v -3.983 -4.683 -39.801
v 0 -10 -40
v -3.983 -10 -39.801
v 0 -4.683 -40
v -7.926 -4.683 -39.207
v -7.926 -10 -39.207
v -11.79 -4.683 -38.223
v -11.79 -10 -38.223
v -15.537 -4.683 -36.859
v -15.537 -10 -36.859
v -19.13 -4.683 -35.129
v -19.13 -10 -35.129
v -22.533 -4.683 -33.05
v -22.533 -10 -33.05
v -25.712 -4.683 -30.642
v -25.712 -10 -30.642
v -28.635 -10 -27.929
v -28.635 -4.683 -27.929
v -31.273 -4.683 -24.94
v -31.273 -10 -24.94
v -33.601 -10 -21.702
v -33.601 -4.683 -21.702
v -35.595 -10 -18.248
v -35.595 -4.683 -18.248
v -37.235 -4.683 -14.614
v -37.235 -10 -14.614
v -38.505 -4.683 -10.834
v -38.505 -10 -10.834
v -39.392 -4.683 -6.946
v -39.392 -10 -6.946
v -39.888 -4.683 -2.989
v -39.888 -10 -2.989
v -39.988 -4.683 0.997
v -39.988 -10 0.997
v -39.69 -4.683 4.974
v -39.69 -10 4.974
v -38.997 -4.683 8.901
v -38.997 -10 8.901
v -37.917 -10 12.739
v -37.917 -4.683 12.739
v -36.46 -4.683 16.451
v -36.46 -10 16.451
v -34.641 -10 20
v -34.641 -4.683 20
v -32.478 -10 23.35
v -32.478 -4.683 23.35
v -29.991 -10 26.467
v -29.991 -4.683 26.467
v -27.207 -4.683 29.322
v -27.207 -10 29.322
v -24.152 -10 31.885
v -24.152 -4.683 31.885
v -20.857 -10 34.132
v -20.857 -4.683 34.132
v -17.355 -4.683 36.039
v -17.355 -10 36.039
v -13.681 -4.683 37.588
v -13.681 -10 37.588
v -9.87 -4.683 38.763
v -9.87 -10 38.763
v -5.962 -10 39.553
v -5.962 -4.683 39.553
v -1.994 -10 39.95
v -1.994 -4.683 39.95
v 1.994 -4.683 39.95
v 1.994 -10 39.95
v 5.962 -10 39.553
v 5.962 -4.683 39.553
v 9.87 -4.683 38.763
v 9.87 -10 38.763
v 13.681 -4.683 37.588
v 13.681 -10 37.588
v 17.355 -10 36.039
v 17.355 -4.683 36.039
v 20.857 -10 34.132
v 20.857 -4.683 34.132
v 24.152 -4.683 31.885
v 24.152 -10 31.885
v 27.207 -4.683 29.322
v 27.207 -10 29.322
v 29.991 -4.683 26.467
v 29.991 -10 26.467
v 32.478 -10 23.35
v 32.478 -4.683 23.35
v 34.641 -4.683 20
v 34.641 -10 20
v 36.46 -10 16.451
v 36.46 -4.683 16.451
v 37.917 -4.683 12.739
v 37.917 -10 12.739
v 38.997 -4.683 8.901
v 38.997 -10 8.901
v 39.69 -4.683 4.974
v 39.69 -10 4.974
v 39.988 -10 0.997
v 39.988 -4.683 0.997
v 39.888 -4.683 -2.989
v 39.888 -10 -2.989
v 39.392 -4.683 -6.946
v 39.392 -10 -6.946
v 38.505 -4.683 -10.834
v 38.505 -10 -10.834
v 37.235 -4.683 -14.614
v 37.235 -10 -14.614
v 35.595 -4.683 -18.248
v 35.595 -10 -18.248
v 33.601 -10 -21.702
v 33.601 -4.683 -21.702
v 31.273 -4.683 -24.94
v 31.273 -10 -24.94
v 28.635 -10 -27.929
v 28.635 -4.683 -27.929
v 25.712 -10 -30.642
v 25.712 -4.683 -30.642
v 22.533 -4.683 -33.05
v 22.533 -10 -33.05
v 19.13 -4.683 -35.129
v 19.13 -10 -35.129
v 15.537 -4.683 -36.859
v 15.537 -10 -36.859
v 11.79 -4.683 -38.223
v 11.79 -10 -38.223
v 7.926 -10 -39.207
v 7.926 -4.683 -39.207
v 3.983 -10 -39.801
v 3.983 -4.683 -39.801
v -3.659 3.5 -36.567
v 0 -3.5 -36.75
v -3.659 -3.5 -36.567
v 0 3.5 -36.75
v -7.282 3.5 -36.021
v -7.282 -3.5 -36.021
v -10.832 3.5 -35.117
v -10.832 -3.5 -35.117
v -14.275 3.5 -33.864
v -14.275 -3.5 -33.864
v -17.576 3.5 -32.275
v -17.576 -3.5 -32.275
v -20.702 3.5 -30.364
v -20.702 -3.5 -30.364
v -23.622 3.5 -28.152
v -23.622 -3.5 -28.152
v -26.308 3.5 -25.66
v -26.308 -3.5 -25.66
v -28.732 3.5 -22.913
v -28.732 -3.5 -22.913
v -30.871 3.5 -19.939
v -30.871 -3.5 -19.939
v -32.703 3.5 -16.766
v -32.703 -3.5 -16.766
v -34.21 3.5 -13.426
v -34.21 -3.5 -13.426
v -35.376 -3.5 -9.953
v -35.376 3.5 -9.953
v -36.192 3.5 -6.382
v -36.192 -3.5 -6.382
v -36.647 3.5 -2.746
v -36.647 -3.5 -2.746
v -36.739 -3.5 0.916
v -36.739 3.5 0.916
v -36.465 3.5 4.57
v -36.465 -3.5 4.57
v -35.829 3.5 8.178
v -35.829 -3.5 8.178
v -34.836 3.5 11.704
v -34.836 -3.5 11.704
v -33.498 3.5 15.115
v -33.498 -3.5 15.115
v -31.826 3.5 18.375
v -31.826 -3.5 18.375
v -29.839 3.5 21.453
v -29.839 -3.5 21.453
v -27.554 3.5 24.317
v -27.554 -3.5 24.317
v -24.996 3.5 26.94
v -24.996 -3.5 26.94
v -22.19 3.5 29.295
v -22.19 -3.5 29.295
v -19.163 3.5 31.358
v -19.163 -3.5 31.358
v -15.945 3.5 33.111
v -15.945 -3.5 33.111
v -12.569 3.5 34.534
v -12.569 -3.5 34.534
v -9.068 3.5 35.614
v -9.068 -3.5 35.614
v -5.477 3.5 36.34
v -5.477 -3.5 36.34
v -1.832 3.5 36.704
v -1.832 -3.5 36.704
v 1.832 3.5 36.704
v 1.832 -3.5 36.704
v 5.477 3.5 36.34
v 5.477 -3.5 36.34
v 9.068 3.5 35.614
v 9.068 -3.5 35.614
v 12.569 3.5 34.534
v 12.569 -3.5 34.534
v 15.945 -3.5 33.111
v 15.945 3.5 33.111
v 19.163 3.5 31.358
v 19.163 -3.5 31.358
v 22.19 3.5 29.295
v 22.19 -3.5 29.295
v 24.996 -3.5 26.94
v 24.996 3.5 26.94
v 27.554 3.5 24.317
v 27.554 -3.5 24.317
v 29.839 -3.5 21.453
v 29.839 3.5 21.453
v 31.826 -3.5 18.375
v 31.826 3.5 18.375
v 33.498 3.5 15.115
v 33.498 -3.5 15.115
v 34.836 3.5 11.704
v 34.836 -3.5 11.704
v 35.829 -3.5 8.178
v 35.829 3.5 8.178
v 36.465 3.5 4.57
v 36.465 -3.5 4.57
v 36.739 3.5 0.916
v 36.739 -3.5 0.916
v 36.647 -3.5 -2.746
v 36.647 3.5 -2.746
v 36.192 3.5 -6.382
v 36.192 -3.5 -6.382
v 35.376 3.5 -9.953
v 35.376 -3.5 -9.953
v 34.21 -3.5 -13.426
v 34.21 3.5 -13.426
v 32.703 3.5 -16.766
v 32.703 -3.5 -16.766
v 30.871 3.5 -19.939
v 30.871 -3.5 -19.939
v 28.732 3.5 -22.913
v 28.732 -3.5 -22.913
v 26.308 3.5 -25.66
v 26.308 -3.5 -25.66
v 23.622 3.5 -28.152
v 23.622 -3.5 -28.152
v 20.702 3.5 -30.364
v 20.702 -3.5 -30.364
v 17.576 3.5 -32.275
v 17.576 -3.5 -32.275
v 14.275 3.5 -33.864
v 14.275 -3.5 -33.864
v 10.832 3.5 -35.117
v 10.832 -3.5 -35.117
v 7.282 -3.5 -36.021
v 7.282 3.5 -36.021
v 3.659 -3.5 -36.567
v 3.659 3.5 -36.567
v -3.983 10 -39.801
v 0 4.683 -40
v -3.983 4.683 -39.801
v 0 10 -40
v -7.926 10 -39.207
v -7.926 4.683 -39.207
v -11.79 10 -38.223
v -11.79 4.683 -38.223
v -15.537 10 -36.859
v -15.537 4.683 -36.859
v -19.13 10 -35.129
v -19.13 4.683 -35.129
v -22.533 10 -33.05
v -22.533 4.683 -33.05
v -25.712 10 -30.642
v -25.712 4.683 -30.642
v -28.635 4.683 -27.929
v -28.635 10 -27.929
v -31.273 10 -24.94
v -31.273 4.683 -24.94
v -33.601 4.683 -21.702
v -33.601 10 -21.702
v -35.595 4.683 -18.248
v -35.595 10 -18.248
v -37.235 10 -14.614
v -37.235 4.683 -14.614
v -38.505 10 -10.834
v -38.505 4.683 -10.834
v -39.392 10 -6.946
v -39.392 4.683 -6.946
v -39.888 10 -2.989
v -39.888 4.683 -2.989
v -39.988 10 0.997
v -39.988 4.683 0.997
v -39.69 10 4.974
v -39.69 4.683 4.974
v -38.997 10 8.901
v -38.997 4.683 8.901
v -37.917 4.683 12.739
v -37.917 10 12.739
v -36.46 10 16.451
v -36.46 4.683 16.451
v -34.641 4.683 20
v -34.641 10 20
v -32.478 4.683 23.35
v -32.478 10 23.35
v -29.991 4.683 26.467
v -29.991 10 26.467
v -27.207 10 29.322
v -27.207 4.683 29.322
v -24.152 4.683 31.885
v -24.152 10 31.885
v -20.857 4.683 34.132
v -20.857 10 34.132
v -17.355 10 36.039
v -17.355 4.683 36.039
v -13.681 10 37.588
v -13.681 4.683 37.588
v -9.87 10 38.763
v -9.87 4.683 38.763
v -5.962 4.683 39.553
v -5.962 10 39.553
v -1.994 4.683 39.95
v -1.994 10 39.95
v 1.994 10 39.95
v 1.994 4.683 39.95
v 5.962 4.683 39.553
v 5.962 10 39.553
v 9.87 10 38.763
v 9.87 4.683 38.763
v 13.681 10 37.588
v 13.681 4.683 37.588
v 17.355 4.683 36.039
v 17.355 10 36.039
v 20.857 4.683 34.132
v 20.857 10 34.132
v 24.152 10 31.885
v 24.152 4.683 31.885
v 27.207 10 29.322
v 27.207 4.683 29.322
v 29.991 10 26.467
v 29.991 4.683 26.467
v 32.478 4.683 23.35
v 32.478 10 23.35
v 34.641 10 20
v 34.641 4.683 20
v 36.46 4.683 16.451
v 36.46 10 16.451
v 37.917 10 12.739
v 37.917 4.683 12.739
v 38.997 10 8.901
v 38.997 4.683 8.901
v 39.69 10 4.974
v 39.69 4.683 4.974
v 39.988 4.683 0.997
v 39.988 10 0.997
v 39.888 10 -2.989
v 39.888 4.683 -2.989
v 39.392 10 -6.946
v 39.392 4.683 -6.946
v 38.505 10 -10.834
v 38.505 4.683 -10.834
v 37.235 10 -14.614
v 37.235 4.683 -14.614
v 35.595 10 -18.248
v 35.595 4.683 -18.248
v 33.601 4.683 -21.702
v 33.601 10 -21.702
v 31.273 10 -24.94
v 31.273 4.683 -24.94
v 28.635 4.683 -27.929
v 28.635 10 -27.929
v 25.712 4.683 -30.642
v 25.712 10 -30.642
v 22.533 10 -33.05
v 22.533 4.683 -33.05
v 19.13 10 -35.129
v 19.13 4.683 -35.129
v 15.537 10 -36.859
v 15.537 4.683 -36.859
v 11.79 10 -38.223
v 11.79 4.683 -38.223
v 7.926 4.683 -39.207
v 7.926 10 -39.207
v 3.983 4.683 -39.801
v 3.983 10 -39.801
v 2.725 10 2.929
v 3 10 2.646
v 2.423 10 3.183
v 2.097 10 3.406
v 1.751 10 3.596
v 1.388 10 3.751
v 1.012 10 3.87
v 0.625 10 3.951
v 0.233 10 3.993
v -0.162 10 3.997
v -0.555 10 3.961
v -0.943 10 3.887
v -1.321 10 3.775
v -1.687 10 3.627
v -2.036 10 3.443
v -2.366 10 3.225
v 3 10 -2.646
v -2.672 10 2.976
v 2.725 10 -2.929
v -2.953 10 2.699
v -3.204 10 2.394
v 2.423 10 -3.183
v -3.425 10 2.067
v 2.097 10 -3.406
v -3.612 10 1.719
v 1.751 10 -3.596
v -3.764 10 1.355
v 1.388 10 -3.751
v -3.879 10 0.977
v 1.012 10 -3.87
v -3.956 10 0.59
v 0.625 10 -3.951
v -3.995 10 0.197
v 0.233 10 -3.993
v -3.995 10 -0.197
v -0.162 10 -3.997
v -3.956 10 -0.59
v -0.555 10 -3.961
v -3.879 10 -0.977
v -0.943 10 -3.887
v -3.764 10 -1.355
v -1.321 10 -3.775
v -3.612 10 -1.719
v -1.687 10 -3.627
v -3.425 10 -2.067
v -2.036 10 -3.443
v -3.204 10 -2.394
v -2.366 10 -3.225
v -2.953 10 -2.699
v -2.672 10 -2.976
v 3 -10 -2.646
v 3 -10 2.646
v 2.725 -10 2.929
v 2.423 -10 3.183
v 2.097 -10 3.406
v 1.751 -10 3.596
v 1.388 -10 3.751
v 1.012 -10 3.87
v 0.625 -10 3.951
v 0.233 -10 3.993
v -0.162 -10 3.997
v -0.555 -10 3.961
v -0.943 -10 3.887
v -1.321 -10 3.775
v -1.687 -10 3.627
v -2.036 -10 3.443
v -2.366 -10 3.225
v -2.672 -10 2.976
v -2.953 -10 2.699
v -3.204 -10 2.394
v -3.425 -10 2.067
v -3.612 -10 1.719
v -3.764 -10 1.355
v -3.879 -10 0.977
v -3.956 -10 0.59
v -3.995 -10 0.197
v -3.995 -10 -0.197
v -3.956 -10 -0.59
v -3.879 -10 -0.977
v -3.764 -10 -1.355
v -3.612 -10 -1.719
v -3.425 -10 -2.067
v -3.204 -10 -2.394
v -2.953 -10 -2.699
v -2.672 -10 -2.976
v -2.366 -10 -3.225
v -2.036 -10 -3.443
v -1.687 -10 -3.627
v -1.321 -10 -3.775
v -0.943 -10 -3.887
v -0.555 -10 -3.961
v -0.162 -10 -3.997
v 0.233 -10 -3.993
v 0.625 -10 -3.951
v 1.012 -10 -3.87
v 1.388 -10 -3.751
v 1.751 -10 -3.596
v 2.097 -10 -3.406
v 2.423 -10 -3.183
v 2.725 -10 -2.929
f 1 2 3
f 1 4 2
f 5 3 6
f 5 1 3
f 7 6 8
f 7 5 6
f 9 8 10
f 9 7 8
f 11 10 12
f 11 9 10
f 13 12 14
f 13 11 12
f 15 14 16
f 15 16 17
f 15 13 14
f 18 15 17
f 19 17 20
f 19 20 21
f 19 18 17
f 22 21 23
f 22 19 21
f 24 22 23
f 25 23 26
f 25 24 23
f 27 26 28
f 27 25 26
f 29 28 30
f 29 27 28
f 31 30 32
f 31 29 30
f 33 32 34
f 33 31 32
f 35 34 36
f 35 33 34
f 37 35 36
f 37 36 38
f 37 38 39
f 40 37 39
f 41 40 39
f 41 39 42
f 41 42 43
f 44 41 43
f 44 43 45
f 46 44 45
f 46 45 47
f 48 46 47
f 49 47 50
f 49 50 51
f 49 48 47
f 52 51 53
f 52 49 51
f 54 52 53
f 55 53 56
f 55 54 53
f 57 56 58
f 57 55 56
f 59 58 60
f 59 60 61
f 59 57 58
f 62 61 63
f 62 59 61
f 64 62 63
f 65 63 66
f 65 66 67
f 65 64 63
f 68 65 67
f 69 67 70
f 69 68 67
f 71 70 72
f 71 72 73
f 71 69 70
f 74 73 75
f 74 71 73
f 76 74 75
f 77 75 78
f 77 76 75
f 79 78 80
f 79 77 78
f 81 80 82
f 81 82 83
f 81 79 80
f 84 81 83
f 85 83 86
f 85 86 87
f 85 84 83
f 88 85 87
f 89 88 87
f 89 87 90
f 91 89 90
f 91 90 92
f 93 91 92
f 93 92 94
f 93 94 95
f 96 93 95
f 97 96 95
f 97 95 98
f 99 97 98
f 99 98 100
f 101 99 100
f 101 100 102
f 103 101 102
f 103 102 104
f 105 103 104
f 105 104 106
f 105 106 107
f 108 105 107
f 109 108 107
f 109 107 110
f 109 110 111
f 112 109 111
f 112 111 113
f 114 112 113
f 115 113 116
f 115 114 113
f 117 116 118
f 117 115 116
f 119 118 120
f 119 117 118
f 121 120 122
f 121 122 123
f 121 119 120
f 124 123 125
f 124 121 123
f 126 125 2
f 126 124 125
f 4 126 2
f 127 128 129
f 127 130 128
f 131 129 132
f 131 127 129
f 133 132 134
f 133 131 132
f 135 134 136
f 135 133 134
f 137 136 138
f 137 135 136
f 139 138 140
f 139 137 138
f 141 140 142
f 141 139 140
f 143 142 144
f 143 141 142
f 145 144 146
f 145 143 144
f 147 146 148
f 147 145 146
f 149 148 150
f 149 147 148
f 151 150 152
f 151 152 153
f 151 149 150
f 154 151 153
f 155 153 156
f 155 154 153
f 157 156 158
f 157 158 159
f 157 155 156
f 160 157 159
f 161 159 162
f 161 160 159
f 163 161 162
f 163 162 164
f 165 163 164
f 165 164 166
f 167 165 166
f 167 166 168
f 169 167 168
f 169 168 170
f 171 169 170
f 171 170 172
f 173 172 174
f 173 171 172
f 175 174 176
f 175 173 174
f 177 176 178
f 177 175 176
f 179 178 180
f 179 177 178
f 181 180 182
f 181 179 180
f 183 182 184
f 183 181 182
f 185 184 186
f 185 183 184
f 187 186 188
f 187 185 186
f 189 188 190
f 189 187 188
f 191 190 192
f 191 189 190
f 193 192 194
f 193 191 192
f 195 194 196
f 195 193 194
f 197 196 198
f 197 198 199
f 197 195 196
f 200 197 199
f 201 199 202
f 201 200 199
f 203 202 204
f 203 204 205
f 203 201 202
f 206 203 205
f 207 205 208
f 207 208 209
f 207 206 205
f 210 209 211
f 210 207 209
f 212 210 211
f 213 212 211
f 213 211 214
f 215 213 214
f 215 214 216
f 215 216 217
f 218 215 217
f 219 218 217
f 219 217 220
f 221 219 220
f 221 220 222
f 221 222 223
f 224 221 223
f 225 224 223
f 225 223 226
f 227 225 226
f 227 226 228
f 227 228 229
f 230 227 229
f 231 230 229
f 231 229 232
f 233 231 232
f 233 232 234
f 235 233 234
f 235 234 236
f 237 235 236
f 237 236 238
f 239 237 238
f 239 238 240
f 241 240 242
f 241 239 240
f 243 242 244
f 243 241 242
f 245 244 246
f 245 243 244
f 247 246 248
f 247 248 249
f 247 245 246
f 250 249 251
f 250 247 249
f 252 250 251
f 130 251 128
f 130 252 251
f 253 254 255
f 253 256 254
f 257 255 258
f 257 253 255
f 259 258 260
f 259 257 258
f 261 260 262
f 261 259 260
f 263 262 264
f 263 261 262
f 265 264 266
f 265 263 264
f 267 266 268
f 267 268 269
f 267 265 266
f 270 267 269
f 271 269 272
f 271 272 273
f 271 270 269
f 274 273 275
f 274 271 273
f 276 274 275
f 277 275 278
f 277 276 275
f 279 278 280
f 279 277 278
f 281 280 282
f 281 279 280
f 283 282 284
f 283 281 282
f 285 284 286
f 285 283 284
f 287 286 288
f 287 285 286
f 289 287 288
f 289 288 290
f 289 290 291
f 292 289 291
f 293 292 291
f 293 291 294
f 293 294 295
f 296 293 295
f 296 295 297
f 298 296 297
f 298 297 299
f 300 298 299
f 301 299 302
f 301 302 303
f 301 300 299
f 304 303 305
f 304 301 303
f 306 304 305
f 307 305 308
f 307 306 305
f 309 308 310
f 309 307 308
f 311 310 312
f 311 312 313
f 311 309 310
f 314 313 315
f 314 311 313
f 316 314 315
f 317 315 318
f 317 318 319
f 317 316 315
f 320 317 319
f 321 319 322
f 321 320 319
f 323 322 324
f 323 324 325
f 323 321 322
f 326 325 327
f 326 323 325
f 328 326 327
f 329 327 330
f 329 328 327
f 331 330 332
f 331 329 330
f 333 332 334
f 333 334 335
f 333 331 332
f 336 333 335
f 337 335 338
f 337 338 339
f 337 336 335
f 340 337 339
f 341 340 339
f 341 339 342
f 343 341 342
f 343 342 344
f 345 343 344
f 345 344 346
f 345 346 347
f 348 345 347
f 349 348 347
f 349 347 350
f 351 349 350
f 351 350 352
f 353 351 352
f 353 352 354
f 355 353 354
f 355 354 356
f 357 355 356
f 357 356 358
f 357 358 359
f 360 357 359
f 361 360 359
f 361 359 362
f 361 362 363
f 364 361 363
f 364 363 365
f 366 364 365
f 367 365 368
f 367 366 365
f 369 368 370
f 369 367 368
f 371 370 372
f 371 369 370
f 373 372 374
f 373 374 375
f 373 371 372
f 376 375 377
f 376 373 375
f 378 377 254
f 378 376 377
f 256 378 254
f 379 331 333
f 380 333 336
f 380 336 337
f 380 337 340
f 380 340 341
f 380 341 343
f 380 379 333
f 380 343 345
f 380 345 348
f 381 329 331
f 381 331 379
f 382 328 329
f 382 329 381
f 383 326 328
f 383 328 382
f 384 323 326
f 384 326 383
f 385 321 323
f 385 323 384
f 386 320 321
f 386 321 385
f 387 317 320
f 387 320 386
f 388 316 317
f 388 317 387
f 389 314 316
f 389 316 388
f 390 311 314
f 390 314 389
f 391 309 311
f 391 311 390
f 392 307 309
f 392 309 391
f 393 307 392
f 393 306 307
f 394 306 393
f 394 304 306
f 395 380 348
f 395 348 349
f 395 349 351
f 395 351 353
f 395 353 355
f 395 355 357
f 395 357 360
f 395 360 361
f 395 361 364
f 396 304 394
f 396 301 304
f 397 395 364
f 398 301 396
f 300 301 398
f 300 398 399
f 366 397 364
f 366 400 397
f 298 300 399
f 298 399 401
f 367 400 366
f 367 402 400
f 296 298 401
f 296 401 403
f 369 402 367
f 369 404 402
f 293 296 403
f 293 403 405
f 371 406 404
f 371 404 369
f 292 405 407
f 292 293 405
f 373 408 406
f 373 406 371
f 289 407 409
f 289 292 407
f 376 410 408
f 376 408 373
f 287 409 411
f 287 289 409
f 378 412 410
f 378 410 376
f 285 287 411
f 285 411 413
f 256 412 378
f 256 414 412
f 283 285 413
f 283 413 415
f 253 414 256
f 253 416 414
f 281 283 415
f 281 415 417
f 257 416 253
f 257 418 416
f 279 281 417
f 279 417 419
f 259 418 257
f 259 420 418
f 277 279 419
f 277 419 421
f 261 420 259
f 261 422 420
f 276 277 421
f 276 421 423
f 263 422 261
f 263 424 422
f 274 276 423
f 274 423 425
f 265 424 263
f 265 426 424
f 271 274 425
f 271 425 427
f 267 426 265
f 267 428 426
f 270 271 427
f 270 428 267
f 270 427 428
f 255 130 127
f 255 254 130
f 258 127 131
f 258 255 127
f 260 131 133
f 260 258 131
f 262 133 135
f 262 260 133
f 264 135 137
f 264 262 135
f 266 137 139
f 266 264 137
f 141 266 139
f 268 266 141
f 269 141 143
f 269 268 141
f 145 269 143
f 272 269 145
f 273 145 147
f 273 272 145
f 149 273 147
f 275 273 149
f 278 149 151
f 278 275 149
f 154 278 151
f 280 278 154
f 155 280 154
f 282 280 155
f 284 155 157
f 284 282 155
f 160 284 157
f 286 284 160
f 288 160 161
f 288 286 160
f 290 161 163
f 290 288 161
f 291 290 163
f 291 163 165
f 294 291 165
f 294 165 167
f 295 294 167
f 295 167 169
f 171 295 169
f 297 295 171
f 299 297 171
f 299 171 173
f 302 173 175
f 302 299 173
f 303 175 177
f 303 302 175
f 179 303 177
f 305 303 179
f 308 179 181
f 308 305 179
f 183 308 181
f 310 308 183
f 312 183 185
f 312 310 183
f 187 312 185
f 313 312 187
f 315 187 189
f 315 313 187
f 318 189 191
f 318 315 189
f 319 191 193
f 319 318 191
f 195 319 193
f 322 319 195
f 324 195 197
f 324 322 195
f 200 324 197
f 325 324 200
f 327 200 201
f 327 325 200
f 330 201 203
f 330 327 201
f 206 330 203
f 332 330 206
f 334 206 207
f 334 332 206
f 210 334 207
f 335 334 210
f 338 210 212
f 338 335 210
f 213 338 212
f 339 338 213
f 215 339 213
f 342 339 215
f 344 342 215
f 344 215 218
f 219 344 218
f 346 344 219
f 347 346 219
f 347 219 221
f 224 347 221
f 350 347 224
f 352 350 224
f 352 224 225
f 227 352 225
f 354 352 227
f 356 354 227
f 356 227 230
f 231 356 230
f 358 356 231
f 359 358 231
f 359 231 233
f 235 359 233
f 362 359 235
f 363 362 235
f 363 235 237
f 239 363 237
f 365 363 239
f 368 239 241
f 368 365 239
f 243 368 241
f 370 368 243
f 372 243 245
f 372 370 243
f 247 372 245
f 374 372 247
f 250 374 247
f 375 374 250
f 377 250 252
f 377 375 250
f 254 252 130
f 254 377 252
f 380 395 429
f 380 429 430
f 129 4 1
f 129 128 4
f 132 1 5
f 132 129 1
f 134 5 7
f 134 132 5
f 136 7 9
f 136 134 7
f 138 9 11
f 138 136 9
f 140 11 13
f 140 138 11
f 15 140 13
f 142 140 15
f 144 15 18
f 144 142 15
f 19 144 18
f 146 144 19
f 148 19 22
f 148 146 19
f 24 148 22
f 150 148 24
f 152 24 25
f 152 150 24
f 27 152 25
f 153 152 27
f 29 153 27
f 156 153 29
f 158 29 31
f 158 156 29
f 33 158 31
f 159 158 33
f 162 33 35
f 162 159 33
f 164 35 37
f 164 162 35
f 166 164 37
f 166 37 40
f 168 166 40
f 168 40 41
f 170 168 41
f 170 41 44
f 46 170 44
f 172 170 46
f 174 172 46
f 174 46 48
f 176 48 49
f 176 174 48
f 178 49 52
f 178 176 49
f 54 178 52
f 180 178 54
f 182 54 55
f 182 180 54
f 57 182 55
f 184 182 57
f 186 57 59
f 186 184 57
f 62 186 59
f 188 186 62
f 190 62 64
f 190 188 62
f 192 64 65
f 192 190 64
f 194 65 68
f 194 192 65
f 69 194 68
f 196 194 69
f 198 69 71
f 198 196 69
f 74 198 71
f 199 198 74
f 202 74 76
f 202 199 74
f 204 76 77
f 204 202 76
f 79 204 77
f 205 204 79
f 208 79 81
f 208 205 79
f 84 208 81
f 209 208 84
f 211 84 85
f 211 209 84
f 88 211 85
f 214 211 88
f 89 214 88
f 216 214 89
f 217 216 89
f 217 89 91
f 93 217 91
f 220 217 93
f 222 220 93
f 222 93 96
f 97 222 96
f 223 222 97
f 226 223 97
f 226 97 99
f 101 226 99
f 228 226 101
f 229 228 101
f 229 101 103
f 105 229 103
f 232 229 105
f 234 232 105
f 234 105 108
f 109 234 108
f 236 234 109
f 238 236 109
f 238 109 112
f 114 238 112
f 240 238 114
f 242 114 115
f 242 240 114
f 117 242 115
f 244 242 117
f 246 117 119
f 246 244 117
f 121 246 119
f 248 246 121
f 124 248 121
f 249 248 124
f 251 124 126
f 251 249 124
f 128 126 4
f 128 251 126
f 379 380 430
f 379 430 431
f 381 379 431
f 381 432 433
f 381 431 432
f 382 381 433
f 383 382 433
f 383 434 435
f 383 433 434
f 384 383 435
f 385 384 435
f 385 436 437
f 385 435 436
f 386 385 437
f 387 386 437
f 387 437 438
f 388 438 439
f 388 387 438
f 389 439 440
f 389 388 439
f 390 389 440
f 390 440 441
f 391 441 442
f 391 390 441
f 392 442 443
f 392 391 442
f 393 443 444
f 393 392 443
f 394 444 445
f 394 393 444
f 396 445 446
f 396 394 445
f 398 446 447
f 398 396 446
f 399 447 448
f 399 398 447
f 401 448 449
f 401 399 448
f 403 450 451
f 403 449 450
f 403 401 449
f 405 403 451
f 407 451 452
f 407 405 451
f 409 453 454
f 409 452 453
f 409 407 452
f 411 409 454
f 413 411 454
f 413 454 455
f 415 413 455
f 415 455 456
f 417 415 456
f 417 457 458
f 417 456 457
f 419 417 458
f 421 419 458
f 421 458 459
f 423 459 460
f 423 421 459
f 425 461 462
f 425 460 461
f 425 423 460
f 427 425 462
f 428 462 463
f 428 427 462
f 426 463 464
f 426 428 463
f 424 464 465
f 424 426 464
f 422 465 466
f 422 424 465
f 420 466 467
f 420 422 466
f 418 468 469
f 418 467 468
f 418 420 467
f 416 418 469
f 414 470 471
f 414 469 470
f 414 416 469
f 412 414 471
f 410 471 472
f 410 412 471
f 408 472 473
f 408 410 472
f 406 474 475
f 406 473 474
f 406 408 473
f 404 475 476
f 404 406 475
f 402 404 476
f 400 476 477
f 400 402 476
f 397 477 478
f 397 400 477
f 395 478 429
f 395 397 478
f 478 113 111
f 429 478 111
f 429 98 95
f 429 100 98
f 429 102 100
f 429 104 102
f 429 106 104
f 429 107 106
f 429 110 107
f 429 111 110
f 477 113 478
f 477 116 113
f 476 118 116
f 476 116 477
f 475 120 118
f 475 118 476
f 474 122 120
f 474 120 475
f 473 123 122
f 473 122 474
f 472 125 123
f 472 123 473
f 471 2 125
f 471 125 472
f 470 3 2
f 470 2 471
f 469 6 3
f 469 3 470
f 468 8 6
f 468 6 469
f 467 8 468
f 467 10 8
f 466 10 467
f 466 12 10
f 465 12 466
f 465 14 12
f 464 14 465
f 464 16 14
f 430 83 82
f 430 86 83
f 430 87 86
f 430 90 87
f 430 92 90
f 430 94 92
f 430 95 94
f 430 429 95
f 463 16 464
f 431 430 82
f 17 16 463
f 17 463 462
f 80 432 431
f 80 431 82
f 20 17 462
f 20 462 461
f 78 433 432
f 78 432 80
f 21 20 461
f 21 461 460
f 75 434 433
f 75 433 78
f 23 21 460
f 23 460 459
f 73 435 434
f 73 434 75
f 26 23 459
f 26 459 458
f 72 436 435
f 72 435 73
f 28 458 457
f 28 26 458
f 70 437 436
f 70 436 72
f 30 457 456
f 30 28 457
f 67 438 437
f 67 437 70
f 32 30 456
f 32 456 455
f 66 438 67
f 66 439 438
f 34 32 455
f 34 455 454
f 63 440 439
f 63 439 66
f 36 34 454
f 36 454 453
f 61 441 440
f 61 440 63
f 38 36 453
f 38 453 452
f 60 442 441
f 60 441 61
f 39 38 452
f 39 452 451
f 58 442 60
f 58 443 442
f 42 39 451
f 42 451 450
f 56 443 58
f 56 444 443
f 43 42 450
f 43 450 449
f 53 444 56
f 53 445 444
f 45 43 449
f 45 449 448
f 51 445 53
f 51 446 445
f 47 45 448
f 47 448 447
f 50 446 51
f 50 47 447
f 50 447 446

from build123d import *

# Parameters (mm, degrees)
CORTAR_EXTRUIR1_DEPTH = 15


with BuildPart() as part:
    # Croquis1 → Revolución1 (revolve)
    with BuildSketch(Plane(origin=(0, 0, 0), x_dir=(0, 0, -1), z_dir=(1, 0, 0))):
        Polygon((40, 10), (0, 10), (0, -10), (40, -10), (40, -4.682903261), (36.75, -3.5), (36.75, 3.5), (40, 4.682903261), align=None)
    revolve(axis=Axis((0, 0, 0), (0, 1, 0)))

    # Croquis2 → Cortar-Extruir1 (cut, symmetric)
    with BuildSketch(Plane(origin=(0, 0, 0), x_dir=(1, 0, 0), z_dir=(0, 1, 0))):
        with BuildLine():
            Line((3, 2.645751311), (3, -2.645751311))
            ThreePointArc((3, -2.645751311), (-4, 0), (3, 2.645751311))
        make_face()
    extrude(amount=CORTAR_EXTRUIR1_DEPTH, both=True, mode=Mode.SUBTRACT)


solid = part.part
